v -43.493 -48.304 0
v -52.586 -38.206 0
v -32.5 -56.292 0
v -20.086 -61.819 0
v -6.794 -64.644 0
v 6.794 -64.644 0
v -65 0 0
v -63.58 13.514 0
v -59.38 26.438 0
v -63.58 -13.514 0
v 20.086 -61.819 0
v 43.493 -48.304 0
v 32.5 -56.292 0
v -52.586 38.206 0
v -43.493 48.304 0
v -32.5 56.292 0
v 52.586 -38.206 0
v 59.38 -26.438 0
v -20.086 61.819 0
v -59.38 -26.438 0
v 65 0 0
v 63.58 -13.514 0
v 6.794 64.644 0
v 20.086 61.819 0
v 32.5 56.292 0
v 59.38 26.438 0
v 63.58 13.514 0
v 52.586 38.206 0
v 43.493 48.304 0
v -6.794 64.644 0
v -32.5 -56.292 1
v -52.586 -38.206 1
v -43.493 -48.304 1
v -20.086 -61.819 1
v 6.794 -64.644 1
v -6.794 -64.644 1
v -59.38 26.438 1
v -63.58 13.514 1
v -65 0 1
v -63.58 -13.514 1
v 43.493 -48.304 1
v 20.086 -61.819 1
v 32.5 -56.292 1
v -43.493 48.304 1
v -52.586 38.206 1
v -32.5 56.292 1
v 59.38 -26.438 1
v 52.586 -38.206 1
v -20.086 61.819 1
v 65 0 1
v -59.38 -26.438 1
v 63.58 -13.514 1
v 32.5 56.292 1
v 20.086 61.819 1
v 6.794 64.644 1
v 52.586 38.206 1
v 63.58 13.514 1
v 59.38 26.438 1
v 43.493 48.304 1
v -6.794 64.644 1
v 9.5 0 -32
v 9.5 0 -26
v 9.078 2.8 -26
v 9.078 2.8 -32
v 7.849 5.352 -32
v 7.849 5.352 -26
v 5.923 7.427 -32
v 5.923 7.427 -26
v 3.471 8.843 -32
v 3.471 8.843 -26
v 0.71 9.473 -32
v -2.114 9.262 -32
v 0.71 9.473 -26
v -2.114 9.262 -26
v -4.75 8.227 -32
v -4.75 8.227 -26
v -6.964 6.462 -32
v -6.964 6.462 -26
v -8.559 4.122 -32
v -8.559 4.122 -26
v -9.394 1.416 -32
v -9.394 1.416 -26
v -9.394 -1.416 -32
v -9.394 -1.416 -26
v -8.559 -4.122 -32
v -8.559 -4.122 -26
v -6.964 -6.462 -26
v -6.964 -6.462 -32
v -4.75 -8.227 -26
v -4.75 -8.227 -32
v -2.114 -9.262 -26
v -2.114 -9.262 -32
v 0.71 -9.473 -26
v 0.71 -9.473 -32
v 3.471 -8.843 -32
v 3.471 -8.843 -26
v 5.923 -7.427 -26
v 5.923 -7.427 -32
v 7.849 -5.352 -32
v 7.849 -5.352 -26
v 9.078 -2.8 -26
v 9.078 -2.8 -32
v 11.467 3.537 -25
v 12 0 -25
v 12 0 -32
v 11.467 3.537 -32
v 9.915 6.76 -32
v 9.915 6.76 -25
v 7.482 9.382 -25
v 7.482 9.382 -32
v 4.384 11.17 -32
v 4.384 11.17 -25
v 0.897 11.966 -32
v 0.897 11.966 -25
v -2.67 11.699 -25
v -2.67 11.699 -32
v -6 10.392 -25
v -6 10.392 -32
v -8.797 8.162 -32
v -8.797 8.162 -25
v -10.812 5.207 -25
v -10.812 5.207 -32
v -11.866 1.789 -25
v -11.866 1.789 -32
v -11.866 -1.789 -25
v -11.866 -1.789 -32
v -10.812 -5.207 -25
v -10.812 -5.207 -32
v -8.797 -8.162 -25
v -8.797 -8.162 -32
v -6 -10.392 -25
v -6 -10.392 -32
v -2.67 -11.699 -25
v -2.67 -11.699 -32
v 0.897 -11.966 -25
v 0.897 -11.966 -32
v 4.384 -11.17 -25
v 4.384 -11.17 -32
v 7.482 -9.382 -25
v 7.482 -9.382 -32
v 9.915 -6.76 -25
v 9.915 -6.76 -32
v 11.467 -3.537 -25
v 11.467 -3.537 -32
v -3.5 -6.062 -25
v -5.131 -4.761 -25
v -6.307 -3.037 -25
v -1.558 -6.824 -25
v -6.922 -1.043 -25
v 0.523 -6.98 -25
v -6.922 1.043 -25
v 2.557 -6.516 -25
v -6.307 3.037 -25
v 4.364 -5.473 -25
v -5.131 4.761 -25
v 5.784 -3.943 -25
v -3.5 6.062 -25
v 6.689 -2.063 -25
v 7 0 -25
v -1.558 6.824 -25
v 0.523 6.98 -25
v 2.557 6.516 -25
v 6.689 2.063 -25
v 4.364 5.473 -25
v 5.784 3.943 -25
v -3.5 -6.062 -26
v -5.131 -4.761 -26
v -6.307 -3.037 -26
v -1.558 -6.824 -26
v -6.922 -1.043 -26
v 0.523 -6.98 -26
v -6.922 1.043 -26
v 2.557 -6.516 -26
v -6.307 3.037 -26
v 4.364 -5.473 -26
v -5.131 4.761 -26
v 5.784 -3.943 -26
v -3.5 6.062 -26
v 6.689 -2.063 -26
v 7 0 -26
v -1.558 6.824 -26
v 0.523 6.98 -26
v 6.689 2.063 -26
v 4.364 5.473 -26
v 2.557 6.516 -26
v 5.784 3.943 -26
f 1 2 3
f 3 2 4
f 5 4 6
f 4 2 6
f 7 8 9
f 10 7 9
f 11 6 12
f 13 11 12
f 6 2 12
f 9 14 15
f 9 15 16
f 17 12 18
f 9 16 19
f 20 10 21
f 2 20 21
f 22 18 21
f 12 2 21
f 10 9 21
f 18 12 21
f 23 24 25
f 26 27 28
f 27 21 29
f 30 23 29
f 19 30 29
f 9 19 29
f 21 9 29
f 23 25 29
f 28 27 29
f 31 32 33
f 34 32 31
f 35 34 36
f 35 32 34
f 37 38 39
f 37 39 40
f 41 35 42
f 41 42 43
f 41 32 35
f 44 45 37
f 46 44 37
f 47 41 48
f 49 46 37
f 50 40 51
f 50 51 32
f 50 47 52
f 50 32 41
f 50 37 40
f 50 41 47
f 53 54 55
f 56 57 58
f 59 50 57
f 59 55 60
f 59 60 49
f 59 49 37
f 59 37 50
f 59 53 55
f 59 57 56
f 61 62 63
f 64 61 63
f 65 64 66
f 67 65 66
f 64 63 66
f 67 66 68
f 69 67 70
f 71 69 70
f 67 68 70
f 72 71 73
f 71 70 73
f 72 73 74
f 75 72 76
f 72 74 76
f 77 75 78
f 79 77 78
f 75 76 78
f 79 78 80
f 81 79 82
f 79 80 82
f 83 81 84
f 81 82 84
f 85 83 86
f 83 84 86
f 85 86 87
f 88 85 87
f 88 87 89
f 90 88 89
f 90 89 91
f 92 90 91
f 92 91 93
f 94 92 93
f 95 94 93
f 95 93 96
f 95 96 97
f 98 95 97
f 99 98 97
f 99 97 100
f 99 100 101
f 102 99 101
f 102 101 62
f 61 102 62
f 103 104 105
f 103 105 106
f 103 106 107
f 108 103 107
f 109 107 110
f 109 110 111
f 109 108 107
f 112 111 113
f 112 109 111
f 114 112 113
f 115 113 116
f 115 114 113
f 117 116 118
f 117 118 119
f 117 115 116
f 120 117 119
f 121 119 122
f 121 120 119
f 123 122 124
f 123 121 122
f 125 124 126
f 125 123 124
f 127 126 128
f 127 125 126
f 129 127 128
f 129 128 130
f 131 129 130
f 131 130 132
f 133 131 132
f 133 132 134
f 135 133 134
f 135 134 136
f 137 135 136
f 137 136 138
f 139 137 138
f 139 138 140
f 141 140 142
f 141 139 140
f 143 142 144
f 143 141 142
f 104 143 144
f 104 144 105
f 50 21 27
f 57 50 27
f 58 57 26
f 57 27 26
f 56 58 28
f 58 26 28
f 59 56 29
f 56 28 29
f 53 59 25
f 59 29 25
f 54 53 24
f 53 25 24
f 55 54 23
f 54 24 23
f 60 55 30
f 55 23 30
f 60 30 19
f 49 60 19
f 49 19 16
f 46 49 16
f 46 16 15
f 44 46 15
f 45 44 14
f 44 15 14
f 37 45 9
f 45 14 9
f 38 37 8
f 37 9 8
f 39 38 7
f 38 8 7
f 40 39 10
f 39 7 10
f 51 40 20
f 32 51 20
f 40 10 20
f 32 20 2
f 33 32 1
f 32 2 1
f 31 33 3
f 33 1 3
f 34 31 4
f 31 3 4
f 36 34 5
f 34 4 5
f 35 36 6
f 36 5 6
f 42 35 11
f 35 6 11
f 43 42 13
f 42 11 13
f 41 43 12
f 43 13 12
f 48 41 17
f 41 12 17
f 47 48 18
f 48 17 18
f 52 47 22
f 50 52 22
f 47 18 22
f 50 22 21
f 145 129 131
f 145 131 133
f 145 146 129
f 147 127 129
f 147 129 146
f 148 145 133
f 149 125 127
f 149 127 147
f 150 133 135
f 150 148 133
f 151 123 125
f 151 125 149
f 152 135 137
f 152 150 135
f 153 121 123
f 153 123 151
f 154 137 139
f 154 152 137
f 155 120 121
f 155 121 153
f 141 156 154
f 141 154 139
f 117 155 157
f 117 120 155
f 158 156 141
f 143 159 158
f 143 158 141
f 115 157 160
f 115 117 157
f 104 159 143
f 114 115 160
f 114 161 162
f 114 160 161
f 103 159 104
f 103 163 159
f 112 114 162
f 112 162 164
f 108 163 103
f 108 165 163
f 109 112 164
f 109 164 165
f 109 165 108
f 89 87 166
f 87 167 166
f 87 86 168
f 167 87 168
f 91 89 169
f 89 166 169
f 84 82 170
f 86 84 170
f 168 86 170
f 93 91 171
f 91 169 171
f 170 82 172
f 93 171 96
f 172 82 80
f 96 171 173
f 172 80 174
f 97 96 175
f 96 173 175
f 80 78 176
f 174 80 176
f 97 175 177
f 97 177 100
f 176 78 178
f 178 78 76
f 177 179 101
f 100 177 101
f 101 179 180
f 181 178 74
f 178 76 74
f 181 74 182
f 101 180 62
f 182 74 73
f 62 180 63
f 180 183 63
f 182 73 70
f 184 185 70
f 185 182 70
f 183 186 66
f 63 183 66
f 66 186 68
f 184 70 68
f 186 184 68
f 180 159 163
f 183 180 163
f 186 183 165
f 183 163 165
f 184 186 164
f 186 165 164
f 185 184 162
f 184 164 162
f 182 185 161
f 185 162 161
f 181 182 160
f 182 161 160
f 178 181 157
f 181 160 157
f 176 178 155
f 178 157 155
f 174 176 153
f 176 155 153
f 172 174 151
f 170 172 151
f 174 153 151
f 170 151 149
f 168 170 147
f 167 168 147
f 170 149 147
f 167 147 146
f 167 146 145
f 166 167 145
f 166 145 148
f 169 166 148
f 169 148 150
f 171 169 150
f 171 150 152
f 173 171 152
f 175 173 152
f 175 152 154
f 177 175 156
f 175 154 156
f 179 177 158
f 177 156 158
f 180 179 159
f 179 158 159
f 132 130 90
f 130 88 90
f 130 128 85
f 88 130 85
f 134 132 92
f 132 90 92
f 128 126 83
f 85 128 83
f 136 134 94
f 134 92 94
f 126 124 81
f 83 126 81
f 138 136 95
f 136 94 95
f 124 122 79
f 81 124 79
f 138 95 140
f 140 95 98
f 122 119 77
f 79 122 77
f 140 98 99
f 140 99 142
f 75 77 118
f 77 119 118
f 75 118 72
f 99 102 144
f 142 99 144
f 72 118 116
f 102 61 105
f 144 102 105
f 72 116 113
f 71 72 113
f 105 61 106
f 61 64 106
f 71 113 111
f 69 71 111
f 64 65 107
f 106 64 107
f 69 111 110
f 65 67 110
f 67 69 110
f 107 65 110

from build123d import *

# Parameters (mm, degrees)
F0_R     = 65
F1_DEPTH = 1
F3_R     = 12
F3_R_2   = 9.5
F4_DEPTH = 7
F3_R_3   = 7
F5_DEPTH = 1


with BuildPart() as f1:
    # F0 (on Top) → F1 (new body)
    with BuildSketch(Plane.XY):
        Circle(F0_R)
    extrude(amount=F1_DEPTH)


with BuildPart() as f4:
    # F3 (on offset) → F4 (new body)
    with BuildSketch(Plane.XY.offset(-25)):
        Circle(F3_R)
        Circle(F3_R_2, mode=Mode.SUBTRACT)
    extrude(amount=-F4_DEPTH)

    # F3 (on offset) → F5 (join)
    with BuildSketch(Plane.XY.offset(-25)):
        Circle(F3_R_2)
        Circle(F3_R_3, mode=Mode.SUBTRACT)
    extrude(amount=-F5_DEPTH)


solid = Compound([f1.part, f4.part])
